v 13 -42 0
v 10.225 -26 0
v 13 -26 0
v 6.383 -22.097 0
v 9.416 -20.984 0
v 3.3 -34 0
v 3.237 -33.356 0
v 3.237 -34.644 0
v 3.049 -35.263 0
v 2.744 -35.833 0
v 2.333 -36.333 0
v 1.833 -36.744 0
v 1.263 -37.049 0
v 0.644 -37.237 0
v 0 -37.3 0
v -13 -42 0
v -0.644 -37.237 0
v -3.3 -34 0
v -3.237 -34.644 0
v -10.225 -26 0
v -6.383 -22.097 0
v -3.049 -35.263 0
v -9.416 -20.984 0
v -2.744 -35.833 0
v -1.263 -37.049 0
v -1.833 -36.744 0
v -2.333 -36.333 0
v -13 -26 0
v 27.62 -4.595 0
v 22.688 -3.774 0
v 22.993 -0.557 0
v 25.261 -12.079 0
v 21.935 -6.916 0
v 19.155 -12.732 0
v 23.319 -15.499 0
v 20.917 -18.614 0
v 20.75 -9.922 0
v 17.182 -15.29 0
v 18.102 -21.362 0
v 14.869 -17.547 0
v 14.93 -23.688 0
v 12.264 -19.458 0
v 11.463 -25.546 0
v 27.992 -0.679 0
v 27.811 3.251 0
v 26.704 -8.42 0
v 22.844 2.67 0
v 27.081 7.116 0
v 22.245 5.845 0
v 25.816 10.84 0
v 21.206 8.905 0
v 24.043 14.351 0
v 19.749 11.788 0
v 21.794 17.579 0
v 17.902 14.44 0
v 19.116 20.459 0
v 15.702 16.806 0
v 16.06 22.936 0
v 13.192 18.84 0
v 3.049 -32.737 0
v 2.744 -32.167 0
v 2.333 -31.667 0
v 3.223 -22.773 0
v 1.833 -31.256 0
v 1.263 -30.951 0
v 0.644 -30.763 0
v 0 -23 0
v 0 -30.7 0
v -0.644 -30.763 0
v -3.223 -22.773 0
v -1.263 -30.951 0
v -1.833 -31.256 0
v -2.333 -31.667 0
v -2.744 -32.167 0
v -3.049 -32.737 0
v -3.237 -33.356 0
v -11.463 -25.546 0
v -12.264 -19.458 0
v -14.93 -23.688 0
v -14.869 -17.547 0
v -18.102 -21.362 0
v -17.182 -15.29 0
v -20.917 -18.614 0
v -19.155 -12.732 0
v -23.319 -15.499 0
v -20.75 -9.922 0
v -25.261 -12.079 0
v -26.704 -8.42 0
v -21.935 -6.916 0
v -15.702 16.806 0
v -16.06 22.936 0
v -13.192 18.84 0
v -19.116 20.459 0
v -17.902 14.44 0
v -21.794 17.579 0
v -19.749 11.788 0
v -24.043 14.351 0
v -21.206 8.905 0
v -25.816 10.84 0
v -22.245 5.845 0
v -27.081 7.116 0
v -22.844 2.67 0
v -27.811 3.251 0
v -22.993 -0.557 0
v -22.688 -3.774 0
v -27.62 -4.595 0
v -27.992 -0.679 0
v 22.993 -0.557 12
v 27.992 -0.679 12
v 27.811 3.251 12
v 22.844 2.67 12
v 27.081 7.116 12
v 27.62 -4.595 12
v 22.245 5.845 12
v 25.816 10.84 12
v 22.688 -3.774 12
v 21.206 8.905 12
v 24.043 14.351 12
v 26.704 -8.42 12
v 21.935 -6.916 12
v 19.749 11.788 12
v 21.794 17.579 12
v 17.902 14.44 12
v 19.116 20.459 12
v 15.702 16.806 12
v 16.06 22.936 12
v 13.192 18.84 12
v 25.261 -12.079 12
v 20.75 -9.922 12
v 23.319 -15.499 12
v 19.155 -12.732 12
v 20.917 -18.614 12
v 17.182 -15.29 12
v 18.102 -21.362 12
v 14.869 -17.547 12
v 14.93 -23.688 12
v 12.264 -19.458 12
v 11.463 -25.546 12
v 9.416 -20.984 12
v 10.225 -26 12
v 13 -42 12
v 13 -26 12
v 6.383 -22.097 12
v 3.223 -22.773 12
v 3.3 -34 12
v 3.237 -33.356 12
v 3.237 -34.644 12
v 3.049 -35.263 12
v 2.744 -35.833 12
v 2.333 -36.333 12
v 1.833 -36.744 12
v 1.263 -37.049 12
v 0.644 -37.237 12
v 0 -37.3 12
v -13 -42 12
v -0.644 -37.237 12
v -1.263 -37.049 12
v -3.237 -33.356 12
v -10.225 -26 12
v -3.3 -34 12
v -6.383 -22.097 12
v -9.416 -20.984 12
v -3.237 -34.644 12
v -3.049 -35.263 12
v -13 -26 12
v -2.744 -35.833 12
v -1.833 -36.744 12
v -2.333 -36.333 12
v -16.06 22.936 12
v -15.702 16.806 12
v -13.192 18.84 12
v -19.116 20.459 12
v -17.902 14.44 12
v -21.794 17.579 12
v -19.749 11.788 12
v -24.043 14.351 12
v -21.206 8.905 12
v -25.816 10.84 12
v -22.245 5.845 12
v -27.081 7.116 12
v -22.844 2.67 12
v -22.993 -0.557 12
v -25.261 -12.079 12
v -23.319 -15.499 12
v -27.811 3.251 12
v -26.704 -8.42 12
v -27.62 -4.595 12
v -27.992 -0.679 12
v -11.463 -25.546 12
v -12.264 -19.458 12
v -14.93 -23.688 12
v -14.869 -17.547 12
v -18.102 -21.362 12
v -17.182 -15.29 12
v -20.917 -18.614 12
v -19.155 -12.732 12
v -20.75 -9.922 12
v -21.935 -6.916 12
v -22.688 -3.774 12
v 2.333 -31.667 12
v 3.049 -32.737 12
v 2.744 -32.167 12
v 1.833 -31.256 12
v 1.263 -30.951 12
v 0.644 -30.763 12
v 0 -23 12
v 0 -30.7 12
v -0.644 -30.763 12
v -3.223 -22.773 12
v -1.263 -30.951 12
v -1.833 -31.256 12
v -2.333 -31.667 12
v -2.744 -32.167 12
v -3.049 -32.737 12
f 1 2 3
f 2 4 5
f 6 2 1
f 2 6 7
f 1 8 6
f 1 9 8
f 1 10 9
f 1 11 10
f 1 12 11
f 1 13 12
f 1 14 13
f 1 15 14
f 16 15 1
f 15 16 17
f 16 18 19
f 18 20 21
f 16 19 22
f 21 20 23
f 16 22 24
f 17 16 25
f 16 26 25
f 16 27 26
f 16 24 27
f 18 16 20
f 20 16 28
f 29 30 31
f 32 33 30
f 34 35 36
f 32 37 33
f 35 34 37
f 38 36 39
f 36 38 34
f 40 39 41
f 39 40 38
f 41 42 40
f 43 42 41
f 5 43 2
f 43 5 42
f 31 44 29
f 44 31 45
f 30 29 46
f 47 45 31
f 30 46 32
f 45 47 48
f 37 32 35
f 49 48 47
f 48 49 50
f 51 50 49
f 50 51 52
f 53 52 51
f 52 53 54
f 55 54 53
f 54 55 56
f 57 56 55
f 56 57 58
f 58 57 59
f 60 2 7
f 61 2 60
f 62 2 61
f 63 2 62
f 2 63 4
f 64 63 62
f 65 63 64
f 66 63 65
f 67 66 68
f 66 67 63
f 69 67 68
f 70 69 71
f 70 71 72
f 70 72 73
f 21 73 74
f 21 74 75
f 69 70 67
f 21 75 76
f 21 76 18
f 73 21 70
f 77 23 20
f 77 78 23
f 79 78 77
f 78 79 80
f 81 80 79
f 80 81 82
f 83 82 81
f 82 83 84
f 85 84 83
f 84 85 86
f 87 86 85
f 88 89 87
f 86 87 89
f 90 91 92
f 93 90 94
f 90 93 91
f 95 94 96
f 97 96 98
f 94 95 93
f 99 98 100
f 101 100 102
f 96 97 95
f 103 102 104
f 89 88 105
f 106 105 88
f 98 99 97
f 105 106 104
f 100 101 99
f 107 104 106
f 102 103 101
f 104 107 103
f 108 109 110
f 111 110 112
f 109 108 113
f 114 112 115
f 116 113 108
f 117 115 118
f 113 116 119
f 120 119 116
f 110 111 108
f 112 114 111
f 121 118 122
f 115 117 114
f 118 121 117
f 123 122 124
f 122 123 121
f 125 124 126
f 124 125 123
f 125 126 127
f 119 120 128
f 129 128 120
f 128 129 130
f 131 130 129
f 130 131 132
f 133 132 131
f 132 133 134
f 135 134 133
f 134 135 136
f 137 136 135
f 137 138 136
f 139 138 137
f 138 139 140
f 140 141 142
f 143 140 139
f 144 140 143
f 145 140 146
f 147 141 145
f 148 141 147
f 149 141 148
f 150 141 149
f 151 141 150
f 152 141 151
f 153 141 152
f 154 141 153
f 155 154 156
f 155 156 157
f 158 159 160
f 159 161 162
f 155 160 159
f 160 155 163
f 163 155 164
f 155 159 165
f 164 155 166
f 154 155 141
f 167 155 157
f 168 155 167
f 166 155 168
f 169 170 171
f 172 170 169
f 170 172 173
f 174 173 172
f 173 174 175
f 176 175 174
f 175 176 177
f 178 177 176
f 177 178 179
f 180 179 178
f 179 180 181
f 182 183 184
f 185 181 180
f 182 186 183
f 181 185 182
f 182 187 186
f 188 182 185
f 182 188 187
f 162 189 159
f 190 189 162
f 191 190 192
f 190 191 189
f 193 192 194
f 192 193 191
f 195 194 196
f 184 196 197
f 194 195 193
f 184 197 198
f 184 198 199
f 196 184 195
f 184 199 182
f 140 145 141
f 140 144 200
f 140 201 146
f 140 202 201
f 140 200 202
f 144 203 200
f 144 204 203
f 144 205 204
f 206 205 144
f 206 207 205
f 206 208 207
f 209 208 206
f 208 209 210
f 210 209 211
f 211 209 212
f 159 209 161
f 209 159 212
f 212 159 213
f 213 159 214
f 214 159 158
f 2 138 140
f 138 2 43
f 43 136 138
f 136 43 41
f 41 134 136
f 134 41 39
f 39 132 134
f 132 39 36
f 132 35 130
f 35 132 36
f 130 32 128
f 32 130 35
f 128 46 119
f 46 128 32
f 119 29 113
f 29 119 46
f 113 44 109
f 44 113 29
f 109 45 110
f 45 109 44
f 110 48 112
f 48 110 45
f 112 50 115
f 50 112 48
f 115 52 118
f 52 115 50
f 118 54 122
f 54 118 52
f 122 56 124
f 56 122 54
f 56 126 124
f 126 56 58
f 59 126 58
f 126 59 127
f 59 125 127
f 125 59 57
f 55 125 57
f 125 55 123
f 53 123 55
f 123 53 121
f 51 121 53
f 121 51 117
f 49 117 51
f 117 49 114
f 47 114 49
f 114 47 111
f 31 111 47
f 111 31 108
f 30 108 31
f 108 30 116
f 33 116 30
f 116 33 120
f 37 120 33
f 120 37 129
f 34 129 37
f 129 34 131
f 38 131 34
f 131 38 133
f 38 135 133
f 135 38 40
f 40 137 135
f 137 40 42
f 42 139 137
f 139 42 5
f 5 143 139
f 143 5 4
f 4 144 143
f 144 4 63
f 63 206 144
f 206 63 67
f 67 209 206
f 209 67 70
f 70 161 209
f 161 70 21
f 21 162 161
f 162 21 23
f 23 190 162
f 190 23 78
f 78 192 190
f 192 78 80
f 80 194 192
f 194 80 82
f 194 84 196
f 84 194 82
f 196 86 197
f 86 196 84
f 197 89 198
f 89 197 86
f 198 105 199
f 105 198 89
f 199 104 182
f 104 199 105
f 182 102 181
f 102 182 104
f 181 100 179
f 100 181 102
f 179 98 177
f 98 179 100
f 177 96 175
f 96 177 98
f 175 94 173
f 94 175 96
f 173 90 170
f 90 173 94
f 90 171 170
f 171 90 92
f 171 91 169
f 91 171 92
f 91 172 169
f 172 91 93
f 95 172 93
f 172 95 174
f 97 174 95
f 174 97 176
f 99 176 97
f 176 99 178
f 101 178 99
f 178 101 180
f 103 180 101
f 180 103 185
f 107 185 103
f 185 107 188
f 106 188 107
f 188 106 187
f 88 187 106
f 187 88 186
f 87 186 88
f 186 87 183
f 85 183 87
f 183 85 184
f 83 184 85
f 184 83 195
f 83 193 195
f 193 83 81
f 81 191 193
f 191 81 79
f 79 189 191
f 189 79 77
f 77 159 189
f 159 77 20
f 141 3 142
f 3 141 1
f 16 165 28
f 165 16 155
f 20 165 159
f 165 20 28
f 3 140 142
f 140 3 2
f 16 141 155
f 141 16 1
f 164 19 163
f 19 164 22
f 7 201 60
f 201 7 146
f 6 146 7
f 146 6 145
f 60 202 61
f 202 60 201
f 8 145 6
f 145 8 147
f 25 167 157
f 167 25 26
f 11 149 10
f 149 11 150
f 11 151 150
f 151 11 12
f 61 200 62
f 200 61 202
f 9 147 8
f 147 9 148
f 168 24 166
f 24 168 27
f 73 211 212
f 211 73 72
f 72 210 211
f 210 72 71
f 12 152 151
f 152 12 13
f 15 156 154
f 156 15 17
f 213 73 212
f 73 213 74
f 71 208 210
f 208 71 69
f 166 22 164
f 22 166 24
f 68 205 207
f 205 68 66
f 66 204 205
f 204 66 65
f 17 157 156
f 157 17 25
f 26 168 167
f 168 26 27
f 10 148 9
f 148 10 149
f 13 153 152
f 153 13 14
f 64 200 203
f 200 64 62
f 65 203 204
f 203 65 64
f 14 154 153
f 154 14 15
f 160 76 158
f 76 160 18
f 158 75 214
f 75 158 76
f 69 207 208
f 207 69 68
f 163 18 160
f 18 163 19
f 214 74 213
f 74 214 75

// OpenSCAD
$fn = 32;

// ----------------------------------------------------------------------
// Spring clip: 56 mm outside, 5 mm band, 70 degree opening
// ----------------------------------------------------------------------

// --- parameters (mm) ---
outer_r = 28;             // clip outside radius
inner_r = 23;             // clip bore radius
band = 5;                 // band thickness
clip_w = 12;              // clip width
opening = 70;             // opening angle
tab_w = 26;               // tab width
tab_len = 14;             // tab length past the clip
tab_hole = 6.6;           // tab fixing hole

clip_profile = [[-16.06, 22.936], [-19.116, 20.459], [-21.794, 17.579], [-24.043, 14.351], [-25.816, 10.84], [-27.081, 7.116], [-27.811, 3.251], [-27.992, -0.679], [-27.62, -4.595], [-26.704, -8.42], [-25.261, -12.079], [-23.319, -15.499], [-20.917, -18.614], [-18.102, -21.362], [-14.93, -23.688], [-11.463, -25.546], [-7.77, -26.9], [-3.924, -27.724], [0, -28], [3.924, -27.724], [7.77, -26.9], [11.463, -25.546], [14.93, -23.688], [18.102, -21.362], [20.917, -18.614], [23.319, -15.499], [25.261, -12.079], [26.704, -8.42], [27.62, -4.595], [27.992, -0.679], [27.811, 3.251], [27.081, 7.116], [25.816, 10.84], [24.043, 14.351], [21.794, 17.579], [19.116, 20.459], [16.06, 22.936], [13.192, 18.84], [15.702, 16.806], [17.902, 14.44], [19.749, 11.788], [21.206, 8.905], [22.245, 5.845], [22.844, 2.67], [22.993, -0.557], [22.688, -3.774], [21.935, -6.916], [20.75, -9.922], [19.155, -12.732], [17.182, -15.29], [14.869, -17.547], [12.264, -19.458], [9.416, -20.984], [6.383, -22.097], [3.223, -22.773], [0, -23], [-3.223, -22.773], [-6.383, -22.097], [-9.416, -20.984], [-12.264, -19.458], [-14.869, -17.547], [-17.182, -15.29], [-19.155, -12.732], [-20.75, -9.922], [-21.935, -6.916], [-22.688, -3.774], [-22.993, -0.557], [-22.844, 2.67], [-22.245, 5.845], [-21.206, 8.905], [-19.749, 11.788], [-17.902, 14.44], [-15.702, 16.806], [-13.192, 18.84]];

difference() {
  union() {
    linear_extrude(height = clip_w) polygon(clip_profile);
    /* mounting tab, sunk 2 mm into the band */
    translate([-13, -42, 0]) cube([tab_w, 16, clip_w]);
  }
  translate([0, -34, -2.5]) cylinder(h = clip_w + 5, d = tab_hole);
}
